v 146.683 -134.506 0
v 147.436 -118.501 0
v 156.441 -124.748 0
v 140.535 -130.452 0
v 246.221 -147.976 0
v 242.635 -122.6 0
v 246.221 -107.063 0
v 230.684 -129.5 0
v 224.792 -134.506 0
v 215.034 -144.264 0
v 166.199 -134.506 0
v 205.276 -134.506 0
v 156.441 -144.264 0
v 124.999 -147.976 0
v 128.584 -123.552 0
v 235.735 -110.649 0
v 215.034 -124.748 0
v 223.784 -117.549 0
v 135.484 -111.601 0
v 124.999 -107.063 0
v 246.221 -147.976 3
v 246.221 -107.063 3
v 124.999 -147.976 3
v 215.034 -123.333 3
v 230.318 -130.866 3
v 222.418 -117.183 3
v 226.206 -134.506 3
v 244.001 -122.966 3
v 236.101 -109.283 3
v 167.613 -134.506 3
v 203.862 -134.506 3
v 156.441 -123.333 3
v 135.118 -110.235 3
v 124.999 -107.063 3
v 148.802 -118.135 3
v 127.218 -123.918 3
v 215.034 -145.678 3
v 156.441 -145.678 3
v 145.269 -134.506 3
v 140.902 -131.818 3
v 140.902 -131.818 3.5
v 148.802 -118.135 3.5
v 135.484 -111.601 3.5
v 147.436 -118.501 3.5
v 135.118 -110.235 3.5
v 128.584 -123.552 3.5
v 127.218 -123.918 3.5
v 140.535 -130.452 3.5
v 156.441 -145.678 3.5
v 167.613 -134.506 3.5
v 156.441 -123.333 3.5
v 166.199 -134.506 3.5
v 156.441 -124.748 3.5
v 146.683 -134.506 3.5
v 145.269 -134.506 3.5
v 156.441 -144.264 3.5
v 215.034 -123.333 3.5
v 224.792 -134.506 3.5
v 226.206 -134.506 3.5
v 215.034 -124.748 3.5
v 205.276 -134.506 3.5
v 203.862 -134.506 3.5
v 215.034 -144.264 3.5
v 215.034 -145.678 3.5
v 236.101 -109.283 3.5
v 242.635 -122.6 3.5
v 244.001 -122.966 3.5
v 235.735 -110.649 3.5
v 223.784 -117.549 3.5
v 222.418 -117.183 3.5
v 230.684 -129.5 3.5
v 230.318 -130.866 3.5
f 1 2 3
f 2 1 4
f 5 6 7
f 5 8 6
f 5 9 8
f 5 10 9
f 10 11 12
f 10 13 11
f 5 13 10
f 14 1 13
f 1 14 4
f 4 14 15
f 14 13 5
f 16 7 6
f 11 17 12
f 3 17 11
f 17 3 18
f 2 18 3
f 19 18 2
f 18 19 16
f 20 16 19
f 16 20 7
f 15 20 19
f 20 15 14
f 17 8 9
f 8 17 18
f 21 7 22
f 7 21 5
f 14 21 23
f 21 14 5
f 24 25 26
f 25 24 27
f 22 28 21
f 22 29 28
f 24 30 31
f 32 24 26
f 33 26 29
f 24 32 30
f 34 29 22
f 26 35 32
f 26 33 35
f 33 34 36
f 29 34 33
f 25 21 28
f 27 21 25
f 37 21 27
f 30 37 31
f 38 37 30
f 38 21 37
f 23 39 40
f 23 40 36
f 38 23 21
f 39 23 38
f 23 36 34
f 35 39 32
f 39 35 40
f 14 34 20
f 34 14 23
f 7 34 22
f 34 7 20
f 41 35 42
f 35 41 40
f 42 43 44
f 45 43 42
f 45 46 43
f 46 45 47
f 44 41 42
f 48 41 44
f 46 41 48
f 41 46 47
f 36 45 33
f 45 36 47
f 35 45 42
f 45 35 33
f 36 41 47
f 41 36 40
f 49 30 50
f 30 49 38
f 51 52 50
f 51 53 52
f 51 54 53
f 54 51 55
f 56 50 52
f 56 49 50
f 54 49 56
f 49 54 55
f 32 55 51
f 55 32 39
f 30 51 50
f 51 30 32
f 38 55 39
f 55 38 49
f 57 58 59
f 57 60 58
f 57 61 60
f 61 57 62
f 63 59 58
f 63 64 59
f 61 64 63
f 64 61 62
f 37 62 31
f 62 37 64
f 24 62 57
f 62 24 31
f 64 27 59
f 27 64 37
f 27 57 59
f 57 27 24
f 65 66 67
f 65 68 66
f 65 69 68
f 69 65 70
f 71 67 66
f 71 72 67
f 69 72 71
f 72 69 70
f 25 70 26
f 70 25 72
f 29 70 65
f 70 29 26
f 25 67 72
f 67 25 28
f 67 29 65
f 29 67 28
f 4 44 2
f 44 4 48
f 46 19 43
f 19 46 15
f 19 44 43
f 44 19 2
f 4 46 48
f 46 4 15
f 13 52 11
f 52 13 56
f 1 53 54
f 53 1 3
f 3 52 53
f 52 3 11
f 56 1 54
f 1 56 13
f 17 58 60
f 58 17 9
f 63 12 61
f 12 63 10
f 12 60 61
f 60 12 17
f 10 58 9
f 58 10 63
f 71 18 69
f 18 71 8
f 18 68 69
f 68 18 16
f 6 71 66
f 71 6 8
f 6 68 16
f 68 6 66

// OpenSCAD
$fn = $preview ? 0 : 100;


difference(){
	difference() {
		union() {
			linear_extrude(height = 3) {
				polygon(points = [[124.99852839420937, -147.97596045400934], [246.22125, -147.97596045400934], [246.22125, -107.06283240868598], [124.99852839420937, -107.06283240868598], [124.99852839420937, -147.97596045400934]]);
			}
			translate(v = [138.0099203653, -121.0267243797, 3]) {
				rotate(a = -30) {
					cube(center = true, size = [15.8000000000, 15.8000000000, 1.0000000000]);
				}
			}
			translate(v = [156.4411152545, -134.5055762724, 3]) {
				rotate(a = -45) {
					cube(center = true, size = [15.8000000000, 15.8000000000, 1.0000000000]);
				}
			}
			translate(v = [215.0338847455, -134.5055762724, 3]) {
				rotate(a = 45) {
					cube(center = true, size = [15.8000000000, 15.8000000000, 1.0000000000]);
				}
			}
			translate(v = [233.2098580290, -120.0742243797, 3]) {
				rotate(a = 30) {
					cube(center = true, size = [15.8000000000, 15.8000000000, 1.0000000000]);
				}
			}
		}
	}
	/* Holes Below*/
	union(){
		translate(v = [138.0099203653, -121.0267243797, 0]) {
			rotate(a = -30) {
				cube(center = true, size = [13.8000000000, 13.8000000000, 8.0000000000]);
			}
		}
		translate(v = [156.4411152545, -134.5055762724, 0]) {
			rotate(a = -45) {
				cube(center = true, size = [13.8000000000, 13.8000000000, 8.0000000000]);
			}
		}
		translate(v = [215.0338847455, -134.5055762724, 0]) {
			rotate(a = 45) {
				cube(center = true, size = [13.8000000000, 13.8000000000, 8.0000000000]);
			}
		}
		translate(v = [233.2098580290, -120.0742243797, 0]) {
			rotate(a = 30) {
				cube(center = true, size = [13.8000000000, 13.8000000000, 8.0000000000]);
			}
		}
	} /* End Holes */ 
}
